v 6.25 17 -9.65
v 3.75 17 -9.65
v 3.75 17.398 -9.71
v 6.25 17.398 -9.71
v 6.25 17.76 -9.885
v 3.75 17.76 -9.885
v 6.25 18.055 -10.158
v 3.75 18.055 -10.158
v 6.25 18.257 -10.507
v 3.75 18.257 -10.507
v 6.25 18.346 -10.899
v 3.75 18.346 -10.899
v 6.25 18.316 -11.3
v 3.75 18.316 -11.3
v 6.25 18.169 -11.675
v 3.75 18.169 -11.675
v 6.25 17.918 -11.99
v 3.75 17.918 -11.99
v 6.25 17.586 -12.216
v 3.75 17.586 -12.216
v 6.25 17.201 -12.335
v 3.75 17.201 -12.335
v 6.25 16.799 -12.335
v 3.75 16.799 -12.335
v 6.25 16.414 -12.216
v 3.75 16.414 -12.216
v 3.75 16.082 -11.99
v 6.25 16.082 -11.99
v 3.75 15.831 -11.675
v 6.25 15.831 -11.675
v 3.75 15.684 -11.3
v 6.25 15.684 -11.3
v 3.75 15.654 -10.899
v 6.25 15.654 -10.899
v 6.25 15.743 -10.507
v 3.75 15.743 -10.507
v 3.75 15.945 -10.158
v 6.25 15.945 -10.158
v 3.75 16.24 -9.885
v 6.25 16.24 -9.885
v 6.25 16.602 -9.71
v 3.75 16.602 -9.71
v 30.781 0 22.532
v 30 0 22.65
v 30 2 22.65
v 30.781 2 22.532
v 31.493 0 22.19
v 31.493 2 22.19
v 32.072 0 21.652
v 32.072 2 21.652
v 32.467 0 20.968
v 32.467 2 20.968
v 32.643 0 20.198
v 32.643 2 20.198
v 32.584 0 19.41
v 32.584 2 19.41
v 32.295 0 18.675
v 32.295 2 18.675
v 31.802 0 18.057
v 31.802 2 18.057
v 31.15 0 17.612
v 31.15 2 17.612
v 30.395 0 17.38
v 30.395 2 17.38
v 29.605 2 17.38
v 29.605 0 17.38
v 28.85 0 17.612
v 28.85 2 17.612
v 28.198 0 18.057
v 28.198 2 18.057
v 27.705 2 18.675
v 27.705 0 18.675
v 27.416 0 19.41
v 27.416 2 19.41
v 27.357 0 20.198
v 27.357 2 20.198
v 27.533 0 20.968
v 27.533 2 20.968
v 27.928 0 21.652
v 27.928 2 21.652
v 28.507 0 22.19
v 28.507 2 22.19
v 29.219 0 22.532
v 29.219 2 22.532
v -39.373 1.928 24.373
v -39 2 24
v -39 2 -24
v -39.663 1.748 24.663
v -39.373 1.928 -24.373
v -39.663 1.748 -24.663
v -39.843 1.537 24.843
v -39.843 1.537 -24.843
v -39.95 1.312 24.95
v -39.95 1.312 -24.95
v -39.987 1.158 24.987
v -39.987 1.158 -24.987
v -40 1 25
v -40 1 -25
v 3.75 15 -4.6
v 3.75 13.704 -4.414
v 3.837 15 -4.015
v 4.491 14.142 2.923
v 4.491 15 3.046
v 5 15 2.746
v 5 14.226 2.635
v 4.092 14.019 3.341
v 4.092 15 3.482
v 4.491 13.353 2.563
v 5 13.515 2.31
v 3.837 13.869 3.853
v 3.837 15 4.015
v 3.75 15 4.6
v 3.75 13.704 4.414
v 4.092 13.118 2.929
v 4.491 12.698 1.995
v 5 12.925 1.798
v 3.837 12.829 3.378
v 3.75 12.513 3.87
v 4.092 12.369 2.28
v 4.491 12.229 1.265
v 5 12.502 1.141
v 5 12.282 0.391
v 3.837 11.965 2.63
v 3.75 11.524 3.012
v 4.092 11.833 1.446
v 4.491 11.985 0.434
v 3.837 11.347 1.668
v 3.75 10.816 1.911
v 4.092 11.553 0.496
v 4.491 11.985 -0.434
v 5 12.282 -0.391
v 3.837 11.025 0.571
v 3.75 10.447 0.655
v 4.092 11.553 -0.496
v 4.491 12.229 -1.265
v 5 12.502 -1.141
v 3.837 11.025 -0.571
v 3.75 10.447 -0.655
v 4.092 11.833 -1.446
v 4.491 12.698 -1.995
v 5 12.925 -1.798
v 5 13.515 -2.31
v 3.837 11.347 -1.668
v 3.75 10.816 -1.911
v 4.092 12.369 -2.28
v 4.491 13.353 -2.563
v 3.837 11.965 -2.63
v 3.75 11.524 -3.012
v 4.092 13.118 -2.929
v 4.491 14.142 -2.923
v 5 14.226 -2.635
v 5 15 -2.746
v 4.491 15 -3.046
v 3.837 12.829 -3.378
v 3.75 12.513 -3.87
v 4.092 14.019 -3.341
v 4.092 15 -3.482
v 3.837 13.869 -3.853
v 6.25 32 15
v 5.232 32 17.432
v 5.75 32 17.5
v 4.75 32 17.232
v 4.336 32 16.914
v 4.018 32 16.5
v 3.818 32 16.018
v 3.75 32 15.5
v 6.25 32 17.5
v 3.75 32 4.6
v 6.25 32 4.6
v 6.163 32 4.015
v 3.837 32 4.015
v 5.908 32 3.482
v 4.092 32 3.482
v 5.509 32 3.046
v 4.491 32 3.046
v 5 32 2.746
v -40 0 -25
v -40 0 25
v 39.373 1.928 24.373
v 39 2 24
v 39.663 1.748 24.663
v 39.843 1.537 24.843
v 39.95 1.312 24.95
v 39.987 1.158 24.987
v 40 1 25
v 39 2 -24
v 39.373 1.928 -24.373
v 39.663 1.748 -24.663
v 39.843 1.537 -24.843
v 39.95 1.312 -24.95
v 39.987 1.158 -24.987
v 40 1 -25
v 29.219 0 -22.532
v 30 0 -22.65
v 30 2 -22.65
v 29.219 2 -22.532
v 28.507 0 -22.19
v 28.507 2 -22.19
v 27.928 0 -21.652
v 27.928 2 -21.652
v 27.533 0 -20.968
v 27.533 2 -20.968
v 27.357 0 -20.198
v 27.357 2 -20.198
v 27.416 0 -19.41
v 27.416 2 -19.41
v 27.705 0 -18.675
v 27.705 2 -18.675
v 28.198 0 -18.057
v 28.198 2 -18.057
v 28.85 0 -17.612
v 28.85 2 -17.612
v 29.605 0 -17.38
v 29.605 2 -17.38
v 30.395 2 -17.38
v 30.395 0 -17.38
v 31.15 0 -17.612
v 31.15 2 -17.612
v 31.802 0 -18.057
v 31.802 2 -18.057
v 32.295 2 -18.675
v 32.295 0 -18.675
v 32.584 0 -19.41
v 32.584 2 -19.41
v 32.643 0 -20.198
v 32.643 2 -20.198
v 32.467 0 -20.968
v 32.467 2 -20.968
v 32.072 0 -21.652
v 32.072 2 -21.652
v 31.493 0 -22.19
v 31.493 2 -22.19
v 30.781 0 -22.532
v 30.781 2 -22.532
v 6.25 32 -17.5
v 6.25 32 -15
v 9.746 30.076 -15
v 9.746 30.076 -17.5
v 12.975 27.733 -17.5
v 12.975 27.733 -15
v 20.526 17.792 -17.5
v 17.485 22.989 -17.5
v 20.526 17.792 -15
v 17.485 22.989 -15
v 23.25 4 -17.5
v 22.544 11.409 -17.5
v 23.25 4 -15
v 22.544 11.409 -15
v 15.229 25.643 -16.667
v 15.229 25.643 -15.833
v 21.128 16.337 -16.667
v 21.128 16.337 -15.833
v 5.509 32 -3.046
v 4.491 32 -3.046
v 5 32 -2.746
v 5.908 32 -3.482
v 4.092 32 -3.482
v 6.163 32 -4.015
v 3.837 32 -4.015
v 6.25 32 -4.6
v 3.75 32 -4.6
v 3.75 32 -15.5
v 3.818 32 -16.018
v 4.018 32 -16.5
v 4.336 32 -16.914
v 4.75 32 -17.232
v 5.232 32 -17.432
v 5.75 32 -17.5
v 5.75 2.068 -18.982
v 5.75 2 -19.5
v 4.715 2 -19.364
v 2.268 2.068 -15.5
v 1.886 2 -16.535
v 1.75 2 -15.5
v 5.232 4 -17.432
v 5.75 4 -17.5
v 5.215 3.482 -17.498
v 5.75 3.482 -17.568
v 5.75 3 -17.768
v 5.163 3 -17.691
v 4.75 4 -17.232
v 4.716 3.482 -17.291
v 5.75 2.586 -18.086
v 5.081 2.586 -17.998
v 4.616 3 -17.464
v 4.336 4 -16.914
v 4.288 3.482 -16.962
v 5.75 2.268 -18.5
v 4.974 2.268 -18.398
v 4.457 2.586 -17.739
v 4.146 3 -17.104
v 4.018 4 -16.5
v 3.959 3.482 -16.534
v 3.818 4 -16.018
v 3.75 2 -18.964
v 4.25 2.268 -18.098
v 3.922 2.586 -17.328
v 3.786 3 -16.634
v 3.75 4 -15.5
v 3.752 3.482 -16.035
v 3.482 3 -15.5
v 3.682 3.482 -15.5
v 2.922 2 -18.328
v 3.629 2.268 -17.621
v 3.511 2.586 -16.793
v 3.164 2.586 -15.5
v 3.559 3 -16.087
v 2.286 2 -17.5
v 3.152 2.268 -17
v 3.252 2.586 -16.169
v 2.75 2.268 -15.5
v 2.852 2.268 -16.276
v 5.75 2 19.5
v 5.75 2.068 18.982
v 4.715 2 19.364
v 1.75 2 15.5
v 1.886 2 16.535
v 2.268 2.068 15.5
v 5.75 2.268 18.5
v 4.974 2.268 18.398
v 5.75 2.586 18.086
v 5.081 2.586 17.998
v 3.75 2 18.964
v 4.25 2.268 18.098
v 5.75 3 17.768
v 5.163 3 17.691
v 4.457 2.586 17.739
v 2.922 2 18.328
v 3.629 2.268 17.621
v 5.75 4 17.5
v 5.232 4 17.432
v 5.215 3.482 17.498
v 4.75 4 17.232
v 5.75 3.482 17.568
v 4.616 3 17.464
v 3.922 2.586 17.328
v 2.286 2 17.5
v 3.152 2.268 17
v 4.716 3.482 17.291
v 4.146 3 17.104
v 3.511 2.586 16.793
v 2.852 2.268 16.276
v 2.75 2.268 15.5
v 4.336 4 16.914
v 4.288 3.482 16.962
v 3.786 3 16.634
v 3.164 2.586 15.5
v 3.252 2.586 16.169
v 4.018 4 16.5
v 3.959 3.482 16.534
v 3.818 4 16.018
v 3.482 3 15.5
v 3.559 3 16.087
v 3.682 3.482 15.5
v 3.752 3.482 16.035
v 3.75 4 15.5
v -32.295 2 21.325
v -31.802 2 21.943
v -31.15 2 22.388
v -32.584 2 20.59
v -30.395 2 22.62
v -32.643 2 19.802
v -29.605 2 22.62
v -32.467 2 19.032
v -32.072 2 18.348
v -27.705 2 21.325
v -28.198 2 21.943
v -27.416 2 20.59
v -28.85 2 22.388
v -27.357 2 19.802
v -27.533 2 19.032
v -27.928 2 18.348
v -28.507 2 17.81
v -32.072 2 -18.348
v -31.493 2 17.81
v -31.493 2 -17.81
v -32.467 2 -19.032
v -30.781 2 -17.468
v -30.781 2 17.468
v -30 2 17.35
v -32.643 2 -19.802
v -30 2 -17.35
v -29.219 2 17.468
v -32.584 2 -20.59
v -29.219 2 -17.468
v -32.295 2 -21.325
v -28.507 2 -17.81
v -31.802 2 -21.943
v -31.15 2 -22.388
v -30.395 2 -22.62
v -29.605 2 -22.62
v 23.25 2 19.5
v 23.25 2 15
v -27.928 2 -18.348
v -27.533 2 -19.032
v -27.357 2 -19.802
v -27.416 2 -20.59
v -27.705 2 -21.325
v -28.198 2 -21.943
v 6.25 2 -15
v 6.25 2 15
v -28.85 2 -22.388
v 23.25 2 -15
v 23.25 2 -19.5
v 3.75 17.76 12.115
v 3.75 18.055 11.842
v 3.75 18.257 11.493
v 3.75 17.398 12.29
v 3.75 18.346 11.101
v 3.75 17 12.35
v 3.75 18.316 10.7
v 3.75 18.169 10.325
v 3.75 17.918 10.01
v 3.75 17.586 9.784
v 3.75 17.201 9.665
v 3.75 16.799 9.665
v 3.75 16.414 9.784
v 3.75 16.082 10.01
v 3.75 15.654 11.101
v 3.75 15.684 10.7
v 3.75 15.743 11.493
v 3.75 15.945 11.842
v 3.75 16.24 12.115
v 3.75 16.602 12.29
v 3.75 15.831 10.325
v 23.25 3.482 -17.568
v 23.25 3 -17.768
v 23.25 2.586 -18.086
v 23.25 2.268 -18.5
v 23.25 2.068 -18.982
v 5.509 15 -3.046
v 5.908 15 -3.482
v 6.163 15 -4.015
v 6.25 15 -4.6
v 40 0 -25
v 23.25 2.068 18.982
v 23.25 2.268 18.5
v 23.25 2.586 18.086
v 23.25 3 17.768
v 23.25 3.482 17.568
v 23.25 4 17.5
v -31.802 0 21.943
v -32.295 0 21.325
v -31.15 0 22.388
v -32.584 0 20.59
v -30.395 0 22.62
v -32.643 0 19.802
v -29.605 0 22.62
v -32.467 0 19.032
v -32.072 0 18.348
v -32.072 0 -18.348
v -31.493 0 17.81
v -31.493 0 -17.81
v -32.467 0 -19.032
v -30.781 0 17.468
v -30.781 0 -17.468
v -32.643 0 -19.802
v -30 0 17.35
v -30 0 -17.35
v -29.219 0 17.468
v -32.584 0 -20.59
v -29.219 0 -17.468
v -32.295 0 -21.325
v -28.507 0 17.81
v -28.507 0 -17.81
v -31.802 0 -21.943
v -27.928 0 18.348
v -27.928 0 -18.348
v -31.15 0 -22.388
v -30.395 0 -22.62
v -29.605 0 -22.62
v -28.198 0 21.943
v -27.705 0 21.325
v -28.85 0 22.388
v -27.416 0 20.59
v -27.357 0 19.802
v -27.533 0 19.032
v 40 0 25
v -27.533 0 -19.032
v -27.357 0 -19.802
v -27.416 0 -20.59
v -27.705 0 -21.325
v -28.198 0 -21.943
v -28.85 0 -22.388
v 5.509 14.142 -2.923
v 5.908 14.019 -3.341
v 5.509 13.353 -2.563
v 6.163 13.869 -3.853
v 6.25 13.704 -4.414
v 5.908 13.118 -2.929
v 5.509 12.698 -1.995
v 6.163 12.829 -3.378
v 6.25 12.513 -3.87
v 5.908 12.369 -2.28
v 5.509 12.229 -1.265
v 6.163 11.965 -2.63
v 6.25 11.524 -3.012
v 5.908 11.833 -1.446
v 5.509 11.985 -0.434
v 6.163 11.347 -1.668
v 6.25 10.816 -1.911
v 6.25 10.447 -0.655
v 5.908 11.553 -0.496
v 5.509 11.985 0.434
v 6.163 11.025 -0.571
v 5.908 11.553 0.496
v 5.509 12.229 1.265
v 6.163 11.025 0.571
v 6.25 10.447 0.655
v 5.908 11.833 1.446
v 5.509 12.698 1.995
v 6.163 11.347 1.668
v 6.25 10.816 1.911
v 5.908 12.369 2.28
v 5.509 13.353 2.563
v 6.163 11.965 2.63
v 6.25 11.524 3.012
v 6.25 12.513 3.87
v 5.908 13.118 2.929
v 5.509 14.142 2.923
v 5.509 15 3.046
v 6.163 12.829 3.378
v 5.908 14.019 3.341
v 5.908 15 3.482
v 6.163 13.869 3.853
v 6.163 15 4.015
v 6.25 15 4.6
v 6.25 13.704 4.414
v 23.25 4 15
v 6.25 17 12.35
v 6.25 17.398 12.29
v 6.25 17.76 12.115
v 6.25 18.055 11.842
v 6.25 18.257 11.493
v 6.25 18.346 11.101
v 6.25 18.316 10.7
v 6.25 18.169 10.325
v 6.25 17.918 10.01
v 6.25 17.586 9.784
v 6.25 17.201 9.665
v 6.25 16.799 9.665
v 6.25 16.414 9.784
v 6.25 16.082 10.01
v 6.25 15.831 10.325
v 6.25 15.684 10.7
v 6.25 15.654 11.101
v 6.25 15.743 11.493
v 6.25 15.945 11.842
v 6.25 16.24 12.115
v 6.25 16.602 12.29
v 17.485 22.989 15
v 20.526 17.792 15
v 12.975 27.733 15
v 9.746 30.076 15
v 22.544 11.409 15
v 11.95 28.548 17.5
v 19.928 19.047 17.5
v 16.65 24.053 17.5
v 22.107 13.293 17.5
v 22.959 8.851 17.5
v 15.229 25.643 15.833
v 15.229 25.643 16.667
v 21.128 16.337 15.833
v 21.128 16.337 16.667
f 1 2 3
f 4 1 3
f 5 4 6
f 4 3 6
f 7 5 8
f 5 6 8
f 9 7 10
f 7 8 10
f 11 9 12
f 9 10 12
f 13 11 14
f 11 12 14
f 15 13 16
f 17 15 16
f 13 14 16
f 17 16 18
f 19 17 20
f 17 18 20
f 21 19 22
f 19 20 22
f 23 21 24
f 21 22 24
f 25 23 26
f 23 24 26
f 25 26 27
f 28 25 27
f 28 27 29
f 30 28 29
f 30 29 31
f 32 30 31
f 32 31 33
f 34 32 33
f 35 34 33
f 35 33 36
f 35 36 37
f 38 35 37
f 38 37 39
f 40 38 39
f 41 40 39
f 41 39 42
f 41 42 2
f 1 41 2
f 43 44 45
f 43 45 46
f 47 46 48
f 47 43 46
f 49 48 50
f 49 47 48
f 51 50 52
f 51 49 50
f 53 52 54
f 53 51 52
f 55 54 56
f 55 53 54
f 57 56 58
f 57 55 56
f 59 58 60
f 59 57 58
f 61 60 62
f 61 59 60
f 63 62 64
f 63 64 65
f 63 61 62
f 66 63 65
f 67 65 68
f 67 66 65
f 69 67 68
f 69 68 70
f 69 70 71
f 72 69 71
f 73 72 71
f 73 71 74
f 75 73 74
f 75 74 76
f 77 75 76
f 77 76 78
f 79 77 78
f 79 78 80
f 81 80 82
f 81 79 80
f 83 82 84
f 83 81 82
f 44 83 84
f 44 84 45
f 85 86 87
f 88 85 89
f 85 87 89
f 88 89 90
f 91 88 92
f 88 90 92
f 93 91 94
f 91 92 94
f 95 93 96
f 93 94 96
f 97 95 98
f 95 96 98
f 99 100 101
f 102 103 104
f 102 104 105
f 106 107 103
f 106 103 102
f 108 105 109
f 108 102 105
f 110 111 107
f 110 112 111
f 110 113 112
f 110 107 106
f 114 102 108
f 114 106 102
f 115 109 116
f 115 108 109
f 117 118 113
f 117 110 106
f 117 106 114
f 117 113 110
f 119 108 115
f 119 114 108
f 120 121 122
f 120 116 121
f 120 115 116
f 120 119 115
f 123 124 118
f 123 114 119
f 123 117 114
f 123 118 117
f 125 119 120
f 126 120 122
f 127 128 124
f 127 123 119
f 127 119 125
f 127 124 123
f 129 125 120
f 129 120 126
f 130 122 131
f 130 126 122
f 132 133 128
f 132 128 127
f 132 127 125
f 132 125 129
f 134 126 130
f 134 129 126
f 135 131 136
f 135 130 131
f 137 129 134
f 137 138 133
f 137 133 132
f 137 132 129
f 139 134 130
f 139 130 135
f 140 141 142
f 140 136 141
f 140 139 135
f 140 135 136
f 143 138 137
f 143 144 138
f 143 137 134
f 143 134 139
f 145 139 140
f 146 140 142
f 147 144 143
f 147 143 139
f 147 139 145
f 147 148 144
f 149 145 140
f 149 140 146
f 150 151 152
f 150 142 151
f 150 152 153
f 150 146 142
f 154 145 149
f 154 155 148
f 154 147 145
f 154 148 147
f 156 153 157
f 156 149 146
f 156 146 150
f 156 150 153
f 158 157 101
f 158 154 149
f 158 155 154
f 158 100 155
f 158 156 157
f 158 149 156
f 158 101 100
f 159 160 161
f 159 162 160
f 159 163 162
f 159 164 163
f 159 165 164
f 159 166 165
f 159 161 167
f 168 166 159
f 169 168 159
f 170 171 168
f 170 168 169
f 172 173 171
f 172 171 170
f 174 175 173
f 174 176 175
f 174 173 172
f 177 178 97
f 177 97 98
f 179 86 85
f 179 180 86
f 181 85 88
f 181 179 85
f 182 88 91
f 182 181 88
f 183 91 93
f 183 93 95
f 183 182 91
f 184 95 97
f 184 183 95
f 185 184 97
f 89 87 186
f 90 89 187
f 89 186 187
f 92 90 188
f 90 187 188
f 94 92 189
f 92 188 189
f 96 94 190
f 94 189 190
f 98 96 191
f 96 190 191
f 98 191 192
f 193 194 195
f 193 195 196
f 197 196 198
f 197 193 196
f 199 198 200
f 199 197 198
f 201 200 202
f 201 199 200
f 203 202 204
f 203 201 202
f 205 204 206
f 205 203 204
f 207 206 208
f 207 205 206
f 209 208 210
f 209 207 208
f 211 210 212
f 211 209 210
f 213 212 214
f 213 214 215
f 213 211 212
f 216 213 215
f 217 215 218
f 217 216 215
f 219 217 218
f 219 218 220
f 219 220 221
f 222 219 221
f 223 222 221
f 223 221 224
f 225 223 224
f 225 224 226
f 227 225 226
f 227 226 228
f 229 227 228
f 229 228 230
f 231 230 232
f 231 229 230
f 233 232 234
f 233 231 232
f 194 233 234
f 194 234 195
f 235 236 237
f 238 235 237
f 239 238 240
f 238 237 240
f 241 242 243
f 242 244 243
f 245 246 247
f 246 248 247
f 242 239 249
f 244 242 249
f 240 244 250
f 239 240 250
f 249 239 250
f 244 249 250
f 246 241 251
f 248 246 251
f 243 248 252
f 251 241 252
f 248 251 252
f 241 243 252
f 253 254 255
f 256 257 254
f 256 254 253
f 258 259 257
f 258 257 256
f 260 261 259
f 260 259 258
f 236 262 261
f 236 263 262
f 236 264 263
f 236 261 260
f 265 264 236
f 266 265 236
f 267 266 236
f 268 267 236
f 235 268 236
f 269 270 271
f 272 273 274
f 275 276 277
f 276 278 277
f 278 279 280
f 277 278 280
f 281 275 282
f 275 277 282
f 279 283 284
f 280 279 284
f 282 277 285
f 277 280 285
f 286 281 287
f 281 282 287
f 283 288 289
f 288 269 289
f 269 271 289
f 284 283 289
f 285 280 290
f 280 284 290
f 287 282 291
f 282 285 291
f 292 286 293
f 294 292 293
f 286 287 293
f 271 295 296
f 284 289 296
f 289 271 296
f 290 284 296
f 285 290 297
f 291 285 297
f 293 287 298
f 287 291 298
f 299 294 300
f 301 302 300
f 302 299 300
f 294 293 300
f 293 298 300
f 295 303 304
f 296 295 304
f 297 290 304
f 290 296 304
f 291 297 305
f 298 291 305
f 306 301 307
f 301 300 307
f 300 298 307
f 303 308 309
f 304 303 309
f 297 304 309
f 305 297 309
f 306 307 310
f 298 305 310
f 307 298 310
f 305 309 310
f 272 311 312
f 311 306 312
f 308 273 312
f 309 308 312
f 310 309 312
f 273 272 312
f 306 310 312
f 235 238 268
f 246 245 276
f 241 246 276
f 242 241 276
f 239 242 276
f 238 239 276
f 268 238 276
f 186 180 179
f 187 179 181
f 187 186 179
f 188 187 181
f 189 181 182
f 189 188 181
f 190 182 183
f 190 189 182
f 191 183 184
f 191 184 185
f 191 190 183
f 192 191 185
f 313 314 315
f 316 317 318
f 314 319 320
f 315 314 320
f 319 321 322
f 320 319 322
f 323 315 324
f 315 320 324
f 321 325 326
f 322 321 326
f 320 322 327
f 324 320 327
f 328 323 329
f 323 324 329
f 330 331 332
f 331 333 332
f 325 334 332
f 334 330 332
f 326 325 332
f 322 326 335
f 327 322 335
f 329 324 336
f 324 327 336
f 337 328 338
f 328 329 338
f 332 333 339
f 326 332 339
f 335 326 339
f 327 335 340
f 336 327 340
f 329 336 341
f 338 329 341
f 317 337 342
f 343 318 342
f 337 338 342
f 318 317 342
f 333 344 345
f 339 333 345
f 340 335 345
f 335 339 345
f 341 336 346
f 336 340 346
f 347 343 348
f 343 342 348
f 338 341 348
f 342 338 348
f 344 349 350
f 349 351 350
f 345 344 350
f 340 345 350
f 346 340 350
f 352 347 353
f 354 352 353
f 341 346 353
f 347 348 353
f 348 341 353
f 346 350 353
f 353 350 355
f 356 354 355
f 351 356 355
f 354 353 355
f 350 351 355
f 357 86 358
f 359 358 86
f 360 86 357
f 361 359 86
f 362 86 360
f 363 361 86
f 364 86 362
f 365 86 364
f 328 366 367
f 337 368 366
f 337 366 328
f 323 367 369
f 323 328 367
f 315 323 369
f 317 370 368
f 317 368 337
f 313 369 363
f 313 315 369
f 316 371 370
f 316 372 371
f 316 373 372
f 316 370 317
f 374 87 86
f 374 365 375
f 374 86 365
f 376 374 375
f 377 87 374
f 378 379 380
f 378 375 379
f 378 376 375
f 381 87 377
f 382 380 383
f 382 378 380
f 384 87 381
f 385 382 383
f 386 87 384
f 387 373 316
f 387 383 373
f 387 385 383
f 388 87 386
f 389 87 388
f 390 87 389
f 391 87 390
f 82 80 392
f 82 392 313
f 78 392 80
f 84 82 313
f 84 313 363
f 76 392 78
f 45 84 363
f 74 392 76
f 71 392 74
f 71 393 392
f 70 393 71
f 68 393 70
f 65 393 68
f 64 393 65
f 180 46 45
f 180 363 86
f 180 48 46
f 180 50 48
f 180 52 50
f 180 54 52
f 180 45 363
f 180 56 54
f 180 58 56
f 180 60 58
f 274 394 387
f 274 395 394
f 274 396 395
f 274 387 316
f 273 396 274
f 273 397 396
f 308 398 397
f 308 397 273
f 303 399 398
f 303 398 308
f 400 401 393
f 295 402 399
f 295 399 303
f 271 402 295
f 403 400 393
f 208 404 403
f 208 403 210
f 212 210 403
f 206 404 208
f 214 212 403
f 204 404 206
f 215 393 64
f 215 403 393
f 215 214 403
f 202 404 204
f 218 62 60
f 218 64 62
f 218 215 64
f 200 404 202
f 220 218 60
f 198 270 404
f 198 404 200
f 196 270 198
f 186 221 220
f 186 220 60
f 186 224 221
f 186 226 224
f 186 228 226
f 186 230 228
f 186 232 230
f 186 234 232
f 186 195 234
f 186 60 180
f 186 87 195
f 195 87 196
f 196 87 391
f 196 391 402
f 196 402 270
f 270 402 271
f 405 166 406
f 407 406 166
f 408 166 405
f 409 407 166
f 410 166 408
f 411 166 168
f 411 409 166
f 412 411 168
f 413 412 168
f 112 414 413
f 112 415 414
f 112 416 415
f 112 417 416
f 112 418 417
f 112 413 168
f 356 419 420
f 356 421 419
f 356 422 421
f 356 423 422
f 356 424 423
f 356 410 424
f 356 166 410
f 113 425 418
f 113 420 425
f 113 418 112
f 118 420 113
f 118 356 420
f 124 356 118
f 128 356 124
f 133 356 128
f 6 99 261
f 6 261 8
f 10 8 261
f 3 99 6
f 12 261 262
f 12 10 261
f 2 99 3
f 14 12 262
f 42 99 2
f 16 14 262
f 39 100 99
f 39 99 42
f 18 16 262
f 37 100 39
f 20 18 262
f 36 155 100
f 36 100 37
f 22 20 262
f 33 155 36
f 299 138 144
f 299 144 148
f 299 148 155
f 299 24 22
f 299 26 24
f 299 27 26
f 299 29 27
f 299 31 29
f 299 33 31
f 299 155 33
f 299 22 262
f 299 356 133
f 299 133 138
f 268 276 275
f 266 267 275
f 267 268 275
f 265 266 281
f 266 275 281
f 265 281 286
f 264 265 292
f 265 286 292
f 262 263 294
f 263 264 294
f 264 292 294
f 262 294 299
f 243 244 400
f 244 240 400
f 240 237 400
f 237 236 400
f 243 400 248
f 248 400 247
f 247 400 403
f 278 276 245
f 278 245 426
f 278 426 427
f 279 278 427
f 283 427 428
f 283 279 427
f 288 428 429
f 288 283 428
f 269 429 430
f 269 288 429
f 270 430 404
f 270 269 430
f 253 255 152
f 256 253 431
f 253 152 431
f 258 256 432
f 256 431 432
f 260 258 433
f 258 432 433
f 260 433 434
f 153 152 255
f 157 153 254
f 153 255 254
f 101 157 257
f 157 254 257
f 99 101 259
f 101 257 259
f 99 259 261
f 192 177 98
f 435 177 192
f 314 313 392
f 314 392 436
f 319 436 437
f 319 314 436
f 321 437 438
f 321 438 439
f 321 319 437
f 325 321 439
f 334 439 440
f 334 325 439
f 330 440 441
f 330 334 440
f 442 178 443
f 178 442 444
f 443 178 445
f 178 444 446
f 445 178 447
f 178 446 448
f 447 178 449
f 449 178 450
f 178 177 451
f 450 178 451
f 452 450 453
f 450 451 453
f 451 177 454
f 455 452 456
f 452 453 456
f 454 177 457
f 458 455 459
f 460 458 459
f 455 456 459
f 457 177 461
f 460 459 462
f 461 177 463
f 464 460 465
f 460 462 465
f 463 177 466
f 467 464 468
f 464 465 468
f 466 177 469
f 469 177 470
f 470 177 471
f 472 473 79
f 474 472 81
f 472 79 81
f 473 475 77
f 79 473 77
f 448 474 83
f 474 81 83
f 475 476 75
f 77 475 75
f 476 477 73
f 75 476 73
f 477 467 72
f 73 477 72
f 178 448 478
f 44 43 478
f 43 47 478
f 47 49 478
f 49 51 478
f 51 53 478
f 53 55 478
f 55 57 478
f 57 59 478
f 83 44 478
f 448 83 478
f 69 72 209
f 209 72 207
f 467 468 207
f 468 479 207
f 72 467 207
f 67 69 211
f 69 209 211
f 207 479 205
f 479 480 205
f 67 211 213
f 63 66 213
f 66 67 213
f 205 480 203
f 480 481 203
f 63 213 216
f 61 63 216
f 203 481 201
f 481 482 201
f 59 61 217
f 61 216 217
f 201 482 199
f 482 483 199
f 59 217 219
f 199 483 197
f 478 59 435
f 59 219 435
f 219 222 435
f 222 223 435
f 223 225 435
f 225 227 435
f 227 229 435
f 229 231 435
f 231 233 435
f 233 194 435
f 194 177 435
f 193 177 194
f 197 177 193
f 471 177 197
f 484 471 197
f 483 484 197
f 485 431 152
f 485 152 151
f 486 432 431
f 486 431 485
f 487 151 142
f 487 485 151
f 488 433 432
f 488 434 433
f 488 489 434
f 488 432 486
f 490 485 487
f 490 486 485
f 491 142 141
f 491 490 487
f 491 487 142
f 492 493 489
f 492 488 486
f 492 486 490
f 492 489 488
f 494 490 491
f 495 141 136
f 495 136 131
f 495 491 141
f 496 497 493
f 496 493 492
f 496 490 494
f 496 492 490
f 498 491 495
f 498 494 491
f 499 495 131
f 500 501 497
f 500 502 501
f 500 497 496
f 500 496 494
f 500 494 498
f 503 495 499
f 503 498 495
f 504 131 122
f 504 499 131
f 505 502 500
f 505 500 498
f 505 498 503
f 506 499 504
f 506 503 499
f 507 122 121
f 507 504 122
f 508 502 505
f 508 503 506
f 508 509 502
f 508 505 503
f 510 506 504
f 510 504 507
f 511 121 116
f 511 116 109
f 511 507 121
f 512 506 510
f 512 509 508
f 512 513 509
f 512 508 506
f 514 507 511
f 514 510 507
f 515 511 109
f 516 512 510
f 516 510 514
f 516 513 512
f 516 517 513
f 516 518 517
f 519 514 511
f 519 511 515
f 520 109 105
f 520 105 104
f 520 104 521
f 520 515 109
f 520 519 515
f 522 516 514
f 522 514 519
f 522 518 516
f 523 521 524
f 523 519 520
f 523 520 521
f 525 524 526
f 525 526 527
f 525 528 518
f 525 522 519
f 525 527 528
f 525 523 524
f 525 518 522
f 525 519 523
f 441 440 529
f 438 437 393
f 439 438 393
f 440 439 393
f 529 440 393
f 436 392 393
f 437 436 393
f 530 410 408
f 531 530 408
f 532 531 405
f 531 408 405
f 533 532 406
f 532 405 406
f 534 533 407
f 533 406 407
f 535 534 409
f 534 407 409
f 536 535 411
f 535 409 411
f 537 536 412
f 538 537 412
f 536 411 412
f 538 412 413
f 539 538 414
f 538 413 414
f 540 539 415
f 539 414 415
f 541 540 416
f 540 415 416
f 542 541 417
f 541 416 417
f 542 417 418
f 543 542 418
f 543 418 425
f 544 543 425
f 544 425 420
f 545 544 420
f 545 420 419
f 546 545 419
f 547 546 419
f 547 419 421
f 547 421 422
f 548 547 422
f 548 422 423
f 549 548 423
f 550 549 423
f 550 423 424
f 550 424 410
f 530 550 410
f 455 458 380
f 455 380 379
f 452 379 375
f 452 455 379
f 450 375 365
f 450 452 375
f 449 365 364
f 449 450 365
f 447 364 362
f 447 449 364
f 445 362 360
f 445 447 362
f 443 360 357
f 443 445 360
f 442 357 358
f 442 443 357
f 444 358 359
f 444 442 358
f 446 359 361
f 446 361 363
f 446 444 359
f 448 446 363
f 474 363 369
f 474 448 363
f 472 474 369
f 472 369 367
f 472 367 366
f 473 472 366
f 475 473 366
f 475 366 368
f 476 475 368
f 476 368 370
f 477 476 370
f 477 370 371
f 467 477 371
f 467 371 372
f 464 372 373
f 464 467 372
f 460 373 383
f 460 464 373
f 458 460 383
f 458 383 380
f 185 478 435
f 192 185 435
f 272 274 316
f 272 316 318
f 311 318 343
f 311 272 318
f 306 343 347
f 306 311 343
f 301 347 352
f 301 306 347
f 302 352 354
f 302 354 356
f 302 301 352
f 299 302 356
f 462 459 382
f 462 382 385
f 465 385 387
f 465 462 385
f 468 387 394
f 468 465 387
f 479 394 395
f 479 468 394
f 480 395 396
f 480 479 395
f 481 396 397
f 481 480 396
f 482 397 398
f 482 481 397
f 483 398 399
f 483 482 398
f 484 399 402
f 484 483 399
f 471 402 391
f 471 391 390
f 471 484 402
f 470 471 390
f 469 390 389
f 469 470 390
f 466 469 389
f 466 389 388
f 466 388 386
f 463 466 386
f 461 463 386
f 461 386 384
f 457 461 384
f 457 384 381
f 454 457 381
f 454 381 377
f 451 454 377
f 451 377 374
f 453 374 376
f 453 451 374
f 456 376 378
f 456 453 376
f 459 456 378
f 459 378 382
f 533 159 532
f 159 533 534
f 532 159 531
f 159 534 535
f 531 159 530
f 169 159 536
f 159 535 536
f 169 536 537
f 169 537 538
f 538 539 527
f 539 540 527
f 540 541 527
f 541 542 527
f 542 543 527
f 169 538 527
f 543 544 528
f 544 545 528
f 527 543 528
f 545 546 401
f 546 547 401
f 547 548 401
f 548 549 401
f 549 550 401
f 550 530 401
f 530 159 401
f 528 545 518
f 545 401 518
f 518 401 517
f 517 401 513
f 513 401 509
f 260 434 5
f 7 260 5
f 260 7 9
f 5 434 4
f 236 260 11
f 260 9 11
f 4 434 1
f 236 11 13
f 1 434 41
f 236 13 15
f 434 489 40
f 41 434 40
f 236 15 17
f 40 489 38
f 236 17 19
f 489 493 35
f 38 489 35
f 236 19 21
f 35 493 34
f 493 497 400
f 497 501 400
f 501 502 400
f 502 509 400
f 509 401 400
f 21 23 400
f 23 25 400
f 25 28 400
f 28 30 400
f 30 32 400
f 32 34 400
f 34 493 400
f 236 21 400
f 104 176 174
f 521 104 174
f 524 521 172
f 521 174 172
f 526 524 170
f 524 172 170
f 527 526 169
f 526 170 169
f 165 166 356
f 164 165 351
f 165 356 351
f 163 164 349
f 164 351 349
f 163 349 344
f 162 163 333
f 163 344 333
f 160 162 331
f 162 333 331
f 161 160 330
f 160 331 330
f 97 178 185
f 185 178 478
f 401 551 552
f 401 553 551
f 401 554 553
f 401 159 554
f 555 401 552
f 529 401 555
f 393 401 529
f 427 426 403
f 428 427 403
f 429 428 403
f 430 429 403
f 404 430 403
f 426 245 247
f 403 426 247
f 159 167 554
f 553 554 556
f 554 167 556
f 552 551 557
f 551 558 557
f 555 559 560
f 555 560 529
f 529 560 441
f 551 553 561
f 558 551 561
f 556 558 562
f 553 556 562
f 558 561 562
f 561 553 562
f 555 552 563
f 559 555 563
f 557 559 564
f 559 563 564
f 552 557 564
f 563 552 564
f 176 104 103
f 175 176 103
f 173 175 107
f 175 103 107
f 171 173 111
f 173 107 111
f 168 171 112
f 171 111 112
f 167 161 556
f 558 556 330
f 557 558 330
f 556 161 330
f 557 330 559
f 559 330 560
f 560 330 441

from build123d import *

# Parameters (mm, degrees)
SKETCH_2_W          = 80
SKETCH_2_H          = 50
SKETCH_2_R          = 2.65
EXTRUDE_1_DEPTH     = 2
SKETCH_3_W          = 2.5
SKETCH_3_H          = 35
SKETCH_3_W_2        = 17
SKETCH_3_H_2        = 2.5
EXTRUDE_2_DEPTH     = 30
CUT_EXTRUDE_1_REACH = 61.691
SKETCH_4_R          = 1.35
SKETCH_4_W          = 5.2
SKETCH_4_H          = 17
FILLET_1_R          = 2
FILLET_2_R          = 1
CUT_EXTRUDE_2_DEPTH = 67.560123197


with BuildPart() as part:
    # 草图2 → 凸台-拉伸1 (new body)
    with BuildSketch(Plane(origin=(0, 0, 0), x_dir=(1, 0, 0), z_dir=(0, 1, 0))):
        Rectangle(SKETCH_2_W, SKETCH_2_H)
        with Locations(Location((-30, 20, 0), (0, 0, 270))):
            Circle(SKETCH_2_R, mode=Mode.SUBTRACT)
        with Locations(Location((30, 20, 0), (0, 0, 90))):
            Circle(SKETCH_2_R, mode=Mode.SUBTRACT)
        with Locations(Location((-30, -20, 0), (0, 0, 90))):
            Circle(SKETCH_2_R, mode=Mode.SUBTRACT)
        with Locations(Location((30, -20, 0), (0, 0, 270))):
            Circle(SKETCH_2_R, mode=Mode.SUBTRACT)
    extrude(amount=EXTRUDE_1_DEPTH)

    # 草图3 → 凸台-拉伸2 (add)
    with BuildSketch(Plane(origin=(0, 2, 0), x_dir=(1, 0, 0), z_dir=(0, 1, 0))):
        with Locations((5, 0)):
            Rectangle(SKETCH_3_W, SKETCH_3_H)
        with Locations((14.75, 16.25)):
            Rectangle(SKETCH_3_W_2, SKETCH_3_H_2)
        with Locations((14.75, -16.25)):
            Rectangle(SKETCH_3_W_2, SKETCH_3_H_2)
    extrude(amount=EXTRUDE_2_DEPTH)

    # 草图4 → 切除-拉伸1 (cut, up to next)
    with BuildSketch(Plane.ZY.offset(-3.75), mode=Mode.PRIVATE) as cut_extrude_1_sk1:
        with Locations((11, 17)):
            Circle(SKETCH_4_R)
    cut_extrude_1_tool1 = extrude(cut_extrude_1_sk1.sketch, amount=-CUT_EXTRUDE_1_REACH, mode=Mode.PRIVATE) & part.part
    # 草图4 → 切除-拉伸1 (cut, up to next)
    with BuildSketch(Plane.ZY.offset(-3.75), mode=Mode.PRIVATE) as cut_extrude_1_sk2:
        with Locations((-11, 17)):
            Circle(SKETCH_4_R)
    cut_extrude_1_tool2 = extrude(cut_extrude_1_sk2.sketch, amount=-CUT_EXTRUDE_1_REACH, mode=Mode.PRIVATE) & part.part
    # 草图4 → 切除-拉伸1 (cut, up to next)
    with BuildSketch(Plane.ZY.offset(-3.75), mode=Mode.PRIVATE) as cut_extrude_1_sk3:
        with Locations((0, 23.5)):
            Rectangle(SKETCH_4_W, SKETCH_4_H)
    cut_extrude_1_tool3 = extrude(cut_extrude_1_sk3.sketch, amount=-CUT_EXTRUDE_1_REACH, mode=Mode.PRIVATE) & part.part
    # 草图4 → 切除-拉伸1 (cut, up to next)
    with BuildSketch(Plane.ZY.offset(-3.75), mode=Mode.PRIVATE) as cut_extrude_1_sk4:
        with BuildLine():
            Line((-2.6, 15), (2.6, 15))
            ThreePointArc((2.6, 15), (0, 12.4), (-2.6, 15))
        make_face()
    cut_extrude_1_tool4 = extrude(cut_extrude_1_sk4.sketch, amount=-CUT_EXTRUDE_1_REACH, mode=Mode.PRIVATE) & part.part
    add(cut_extrude_1_tool1.solids().sort_by_distance((3.75, 17, 11))[0], mode=Mode.SUBTRACT)
    add(cut_extrude_1_tool2.solids().sort_by_distance((3.75, 17, -11))[0], mode=Mode.SUBTRACT)
    add(cut_extrude_1_tool3.solids().sort_by_distance((3.75, 23.5, 0))[0], mode=Mode.SUBTRACT)
    add(cut_extrude_1_tool4.solids().sort_by_distance((3.75, 13.896526, 0))[0], mode=Mode.SUBTRACT)

    # 圆角1
    # the kernel refuses this fillet: 2 mm, written as the material it takes off along each edge
    with BuildSketch(Plane(origin=(6.25, 37, 2.6), x_dir=(0, 0, 1), z_dir=(0, -1, 0)), Plane(origin=(6.25, 15, -2.6), x_dir=(0, 0, -1), z_dir=(0, 1, 0)), Plane(origin=(3.75, 37, -2.6), x_dir=(0, 0, -1), z_dir=(0, -1, 0)), Plane(origin=(3.75, 15, 2.6), x_dir=(0, 0, 1), z_dir=(0, 1, 0))) as fillet_1_piece_1:
        with BuildLine():
            CenterArc((FILLET_1_R, FILLET_1_R), FILLET_1_R, 180, 90)
            Line((0, FILLET_1_R), (0, 0))
            Line((0, 0), (FILLET_1_R, 0))
        make_face()
    extrude(amount=22, mode=Mode.SUBTRACT)
    with BuildSketch(Plane(origin=(6.25, 15, 0), x_dir=(0, 0, -1), z_dir=(0, 1, 0))) as fillet_1_piece_2:
        with BuildLine():
            CenterArc((2.6 + FILLET_1_R, FILLET_1_R), FILLET_1_R, 180, 90)
            Line((2.6, FILLET_1_R), (2.6, 0))
            Line((2.6, 0), (2.6 + FILLET_1_R, 0))
        make_face()
    revolve(axis=Axis((6.25, 15, 0), (-1, 0, 0)), revolution_arc=180, mode=Mode.SUBTRACT)
    with BuildSketch(Plane(origin=(3.75, 15, 0), x_dir=(0, 0, 1), z_dir=(0, 1, 0))) as fillet_1_piece_3:
        with BuildLine():
            CenterArc((2.6 + FILLET_1_R, FILLET_1_R), FILLET_1_R, 180, 90)
            Line((2.6, FILLET_1_R), (2.6, 0))
            Line((2.6, 0), (2.6 + FILLET_1_R, 0))
        make_face()
    revolve(axis=Axis((3.75, 15, 0), (1, 0, 0)), revolution_arc=180, mode=Mode.SUBTRACT)
    with BuildSketch(Plane(origin=(3.75, 2, -17.5), x_dir=(1, 0, 0), z_dir=(0, 1, 0))) as fillet_1_piece_4:
        with BuildLine():
            CenterArc((FILLET_1_R, -FILLET_1_R), FILLET_1_R, 90, 90)
            Line((0, -FILLET_1_R), (0, 0))
            Line((0, 0), (FILLET_1_R, 0))
        make_face()
    extrude(amount=35, mode=Mode.SUBTRACT)
    with BuildSketch(Plane(origin=(3.75, 2, 17.5), x_dir=(1, 0, 0), z_dir=(0, 1, 0))) as fillet_1_piece_5:
        with BuildLine():
            CenterArc((FILLET_1_R, FILLET_1_R), FILLET_1_R, 180, 90)
            Line((0, FILLET_1_R), (0, 0))
            Line((0, 0), (FILLET_1_R, 0))
        make_face()
    extrude(amount=35, mode=Mode.SUBTRACT)
    # the kernel refuses this fillet: 2 mm, written as the material it adds along each edge
    with BuildSketch(Plane(origin=(5.75, 2, 17.5), x_dir=(0, 0, 1), z_dir=(1, 0, 0))) as fillet_1_2_piece_1:
        with BuildLine():
            CenterArc((FILLET_1_R, -FILLET_1_R), FILLET_1_R, 90, 90)
            Line((0, -FILLET_1_R), (0, 0))
            Line((0, 0), (FILLET_1_R, 0))
        make_face()
    extrude(amount=17.5)
    with BuildSketch(Plane(origin=(5.75, 2, -17.5), x_dir=(0, 0, -1), z_dir=(1, 0, 0))) as fillet_1_2_piece_2:
        with BuildLine():
            CenterArc((FILLET_1_R, FILLET_1_R), FILLET_1_R, 180, 90)
            Line((0, FILLET_1_R), (0, 0))
            Line((0, 0), (FILLET_1_R, 0))
        make_face()
    extrude(amount=17.5)
    with BuildSketch(Plane(origin=(3.75, 2, -15.5), x_dir=(-1, 0, 0), z_dir=(0, 0, 1))) as fillet_1_2_piece_3:
        with BuildLine():
            CenterArc((FILLET_1_R, -FILLET_1_R), FILLET_1_R, 90, 90)
            Line((0, -FILLET_1_R), (0, 0))
            Line((0, 0), (FILLET_1_R, 0))
        make_face()
    extrude(amount=31)
    with BuildSketch(Plane(origin=(5.75, 2, -15.5), x_dir=(0, 0, -1), z_dir=(1, 0, 0))) as fillet_1_2_piece_4:
        with BuildLine():
            CenterArc((2 + FILLET_1_R, FILLET_1_R), FILLET_1_R, 180, 90)
            Line((2, FILLET_1_R), (2, 0))
            Line((2, 0), (2 + FILLET_1_R, 0))
        make_face()
    revolve(axis=Axis((5.75, 2, -15.5), (0, 1, 0)), revolution_arc=90)
    with BuildSketch(Plane(origin=(5.75, 2, 15.5), x_dir=(0, 0, 1), z_dir=(1, 0, 0))) as fillet_1_2_piece_5:
        with BuildLine():
            CenterArc((2 + FILLET_1_R, -FILLET_1_R), FILLET_1_R, 90, 90)
            Line((2, -FILLET_1_R), (2, 0))
            Line((2, 0), (2 + FILLET_1_R, 0))
        make_face()
    revolve(axis=Axis((5.75, 2, 15.5), (0, -1, 0)), revolution_arc=90)

    # 圆角2
    fillet_2_edges = [part.edges().sort_by_distance(p)[0] for p in [
        (-40, 2, 0),
        (0, 2, 25),
        (40, 2, 0),
        (0, 2, -25),
    ]]
    fillet(fillet_2_edges, radius=FILLET_2_R)

    # 草图5 → 切除-拉伸2 (cut, through all)
    with BuildSketch(Plane.XY.offset(17.5)):
        with BuildLine():
            Line((23.25, 32), (6.25, 32))
            add(Edge.make_bspline(
                [(6.25, 32), (16.534964458, 27.088669385), (23.25, 17.881434401), (23.25, 4)],
                knots=[0, 0, 0, 0, 1, 1, 1, 1], degree=3))
            Line((23.25, 4), (23.25, 32))
        make_face()
    extrude(amount=-CUT_EXTRUDE_2_DEPTH, mode=Mode.SUBTRACT)


solid = part.part
